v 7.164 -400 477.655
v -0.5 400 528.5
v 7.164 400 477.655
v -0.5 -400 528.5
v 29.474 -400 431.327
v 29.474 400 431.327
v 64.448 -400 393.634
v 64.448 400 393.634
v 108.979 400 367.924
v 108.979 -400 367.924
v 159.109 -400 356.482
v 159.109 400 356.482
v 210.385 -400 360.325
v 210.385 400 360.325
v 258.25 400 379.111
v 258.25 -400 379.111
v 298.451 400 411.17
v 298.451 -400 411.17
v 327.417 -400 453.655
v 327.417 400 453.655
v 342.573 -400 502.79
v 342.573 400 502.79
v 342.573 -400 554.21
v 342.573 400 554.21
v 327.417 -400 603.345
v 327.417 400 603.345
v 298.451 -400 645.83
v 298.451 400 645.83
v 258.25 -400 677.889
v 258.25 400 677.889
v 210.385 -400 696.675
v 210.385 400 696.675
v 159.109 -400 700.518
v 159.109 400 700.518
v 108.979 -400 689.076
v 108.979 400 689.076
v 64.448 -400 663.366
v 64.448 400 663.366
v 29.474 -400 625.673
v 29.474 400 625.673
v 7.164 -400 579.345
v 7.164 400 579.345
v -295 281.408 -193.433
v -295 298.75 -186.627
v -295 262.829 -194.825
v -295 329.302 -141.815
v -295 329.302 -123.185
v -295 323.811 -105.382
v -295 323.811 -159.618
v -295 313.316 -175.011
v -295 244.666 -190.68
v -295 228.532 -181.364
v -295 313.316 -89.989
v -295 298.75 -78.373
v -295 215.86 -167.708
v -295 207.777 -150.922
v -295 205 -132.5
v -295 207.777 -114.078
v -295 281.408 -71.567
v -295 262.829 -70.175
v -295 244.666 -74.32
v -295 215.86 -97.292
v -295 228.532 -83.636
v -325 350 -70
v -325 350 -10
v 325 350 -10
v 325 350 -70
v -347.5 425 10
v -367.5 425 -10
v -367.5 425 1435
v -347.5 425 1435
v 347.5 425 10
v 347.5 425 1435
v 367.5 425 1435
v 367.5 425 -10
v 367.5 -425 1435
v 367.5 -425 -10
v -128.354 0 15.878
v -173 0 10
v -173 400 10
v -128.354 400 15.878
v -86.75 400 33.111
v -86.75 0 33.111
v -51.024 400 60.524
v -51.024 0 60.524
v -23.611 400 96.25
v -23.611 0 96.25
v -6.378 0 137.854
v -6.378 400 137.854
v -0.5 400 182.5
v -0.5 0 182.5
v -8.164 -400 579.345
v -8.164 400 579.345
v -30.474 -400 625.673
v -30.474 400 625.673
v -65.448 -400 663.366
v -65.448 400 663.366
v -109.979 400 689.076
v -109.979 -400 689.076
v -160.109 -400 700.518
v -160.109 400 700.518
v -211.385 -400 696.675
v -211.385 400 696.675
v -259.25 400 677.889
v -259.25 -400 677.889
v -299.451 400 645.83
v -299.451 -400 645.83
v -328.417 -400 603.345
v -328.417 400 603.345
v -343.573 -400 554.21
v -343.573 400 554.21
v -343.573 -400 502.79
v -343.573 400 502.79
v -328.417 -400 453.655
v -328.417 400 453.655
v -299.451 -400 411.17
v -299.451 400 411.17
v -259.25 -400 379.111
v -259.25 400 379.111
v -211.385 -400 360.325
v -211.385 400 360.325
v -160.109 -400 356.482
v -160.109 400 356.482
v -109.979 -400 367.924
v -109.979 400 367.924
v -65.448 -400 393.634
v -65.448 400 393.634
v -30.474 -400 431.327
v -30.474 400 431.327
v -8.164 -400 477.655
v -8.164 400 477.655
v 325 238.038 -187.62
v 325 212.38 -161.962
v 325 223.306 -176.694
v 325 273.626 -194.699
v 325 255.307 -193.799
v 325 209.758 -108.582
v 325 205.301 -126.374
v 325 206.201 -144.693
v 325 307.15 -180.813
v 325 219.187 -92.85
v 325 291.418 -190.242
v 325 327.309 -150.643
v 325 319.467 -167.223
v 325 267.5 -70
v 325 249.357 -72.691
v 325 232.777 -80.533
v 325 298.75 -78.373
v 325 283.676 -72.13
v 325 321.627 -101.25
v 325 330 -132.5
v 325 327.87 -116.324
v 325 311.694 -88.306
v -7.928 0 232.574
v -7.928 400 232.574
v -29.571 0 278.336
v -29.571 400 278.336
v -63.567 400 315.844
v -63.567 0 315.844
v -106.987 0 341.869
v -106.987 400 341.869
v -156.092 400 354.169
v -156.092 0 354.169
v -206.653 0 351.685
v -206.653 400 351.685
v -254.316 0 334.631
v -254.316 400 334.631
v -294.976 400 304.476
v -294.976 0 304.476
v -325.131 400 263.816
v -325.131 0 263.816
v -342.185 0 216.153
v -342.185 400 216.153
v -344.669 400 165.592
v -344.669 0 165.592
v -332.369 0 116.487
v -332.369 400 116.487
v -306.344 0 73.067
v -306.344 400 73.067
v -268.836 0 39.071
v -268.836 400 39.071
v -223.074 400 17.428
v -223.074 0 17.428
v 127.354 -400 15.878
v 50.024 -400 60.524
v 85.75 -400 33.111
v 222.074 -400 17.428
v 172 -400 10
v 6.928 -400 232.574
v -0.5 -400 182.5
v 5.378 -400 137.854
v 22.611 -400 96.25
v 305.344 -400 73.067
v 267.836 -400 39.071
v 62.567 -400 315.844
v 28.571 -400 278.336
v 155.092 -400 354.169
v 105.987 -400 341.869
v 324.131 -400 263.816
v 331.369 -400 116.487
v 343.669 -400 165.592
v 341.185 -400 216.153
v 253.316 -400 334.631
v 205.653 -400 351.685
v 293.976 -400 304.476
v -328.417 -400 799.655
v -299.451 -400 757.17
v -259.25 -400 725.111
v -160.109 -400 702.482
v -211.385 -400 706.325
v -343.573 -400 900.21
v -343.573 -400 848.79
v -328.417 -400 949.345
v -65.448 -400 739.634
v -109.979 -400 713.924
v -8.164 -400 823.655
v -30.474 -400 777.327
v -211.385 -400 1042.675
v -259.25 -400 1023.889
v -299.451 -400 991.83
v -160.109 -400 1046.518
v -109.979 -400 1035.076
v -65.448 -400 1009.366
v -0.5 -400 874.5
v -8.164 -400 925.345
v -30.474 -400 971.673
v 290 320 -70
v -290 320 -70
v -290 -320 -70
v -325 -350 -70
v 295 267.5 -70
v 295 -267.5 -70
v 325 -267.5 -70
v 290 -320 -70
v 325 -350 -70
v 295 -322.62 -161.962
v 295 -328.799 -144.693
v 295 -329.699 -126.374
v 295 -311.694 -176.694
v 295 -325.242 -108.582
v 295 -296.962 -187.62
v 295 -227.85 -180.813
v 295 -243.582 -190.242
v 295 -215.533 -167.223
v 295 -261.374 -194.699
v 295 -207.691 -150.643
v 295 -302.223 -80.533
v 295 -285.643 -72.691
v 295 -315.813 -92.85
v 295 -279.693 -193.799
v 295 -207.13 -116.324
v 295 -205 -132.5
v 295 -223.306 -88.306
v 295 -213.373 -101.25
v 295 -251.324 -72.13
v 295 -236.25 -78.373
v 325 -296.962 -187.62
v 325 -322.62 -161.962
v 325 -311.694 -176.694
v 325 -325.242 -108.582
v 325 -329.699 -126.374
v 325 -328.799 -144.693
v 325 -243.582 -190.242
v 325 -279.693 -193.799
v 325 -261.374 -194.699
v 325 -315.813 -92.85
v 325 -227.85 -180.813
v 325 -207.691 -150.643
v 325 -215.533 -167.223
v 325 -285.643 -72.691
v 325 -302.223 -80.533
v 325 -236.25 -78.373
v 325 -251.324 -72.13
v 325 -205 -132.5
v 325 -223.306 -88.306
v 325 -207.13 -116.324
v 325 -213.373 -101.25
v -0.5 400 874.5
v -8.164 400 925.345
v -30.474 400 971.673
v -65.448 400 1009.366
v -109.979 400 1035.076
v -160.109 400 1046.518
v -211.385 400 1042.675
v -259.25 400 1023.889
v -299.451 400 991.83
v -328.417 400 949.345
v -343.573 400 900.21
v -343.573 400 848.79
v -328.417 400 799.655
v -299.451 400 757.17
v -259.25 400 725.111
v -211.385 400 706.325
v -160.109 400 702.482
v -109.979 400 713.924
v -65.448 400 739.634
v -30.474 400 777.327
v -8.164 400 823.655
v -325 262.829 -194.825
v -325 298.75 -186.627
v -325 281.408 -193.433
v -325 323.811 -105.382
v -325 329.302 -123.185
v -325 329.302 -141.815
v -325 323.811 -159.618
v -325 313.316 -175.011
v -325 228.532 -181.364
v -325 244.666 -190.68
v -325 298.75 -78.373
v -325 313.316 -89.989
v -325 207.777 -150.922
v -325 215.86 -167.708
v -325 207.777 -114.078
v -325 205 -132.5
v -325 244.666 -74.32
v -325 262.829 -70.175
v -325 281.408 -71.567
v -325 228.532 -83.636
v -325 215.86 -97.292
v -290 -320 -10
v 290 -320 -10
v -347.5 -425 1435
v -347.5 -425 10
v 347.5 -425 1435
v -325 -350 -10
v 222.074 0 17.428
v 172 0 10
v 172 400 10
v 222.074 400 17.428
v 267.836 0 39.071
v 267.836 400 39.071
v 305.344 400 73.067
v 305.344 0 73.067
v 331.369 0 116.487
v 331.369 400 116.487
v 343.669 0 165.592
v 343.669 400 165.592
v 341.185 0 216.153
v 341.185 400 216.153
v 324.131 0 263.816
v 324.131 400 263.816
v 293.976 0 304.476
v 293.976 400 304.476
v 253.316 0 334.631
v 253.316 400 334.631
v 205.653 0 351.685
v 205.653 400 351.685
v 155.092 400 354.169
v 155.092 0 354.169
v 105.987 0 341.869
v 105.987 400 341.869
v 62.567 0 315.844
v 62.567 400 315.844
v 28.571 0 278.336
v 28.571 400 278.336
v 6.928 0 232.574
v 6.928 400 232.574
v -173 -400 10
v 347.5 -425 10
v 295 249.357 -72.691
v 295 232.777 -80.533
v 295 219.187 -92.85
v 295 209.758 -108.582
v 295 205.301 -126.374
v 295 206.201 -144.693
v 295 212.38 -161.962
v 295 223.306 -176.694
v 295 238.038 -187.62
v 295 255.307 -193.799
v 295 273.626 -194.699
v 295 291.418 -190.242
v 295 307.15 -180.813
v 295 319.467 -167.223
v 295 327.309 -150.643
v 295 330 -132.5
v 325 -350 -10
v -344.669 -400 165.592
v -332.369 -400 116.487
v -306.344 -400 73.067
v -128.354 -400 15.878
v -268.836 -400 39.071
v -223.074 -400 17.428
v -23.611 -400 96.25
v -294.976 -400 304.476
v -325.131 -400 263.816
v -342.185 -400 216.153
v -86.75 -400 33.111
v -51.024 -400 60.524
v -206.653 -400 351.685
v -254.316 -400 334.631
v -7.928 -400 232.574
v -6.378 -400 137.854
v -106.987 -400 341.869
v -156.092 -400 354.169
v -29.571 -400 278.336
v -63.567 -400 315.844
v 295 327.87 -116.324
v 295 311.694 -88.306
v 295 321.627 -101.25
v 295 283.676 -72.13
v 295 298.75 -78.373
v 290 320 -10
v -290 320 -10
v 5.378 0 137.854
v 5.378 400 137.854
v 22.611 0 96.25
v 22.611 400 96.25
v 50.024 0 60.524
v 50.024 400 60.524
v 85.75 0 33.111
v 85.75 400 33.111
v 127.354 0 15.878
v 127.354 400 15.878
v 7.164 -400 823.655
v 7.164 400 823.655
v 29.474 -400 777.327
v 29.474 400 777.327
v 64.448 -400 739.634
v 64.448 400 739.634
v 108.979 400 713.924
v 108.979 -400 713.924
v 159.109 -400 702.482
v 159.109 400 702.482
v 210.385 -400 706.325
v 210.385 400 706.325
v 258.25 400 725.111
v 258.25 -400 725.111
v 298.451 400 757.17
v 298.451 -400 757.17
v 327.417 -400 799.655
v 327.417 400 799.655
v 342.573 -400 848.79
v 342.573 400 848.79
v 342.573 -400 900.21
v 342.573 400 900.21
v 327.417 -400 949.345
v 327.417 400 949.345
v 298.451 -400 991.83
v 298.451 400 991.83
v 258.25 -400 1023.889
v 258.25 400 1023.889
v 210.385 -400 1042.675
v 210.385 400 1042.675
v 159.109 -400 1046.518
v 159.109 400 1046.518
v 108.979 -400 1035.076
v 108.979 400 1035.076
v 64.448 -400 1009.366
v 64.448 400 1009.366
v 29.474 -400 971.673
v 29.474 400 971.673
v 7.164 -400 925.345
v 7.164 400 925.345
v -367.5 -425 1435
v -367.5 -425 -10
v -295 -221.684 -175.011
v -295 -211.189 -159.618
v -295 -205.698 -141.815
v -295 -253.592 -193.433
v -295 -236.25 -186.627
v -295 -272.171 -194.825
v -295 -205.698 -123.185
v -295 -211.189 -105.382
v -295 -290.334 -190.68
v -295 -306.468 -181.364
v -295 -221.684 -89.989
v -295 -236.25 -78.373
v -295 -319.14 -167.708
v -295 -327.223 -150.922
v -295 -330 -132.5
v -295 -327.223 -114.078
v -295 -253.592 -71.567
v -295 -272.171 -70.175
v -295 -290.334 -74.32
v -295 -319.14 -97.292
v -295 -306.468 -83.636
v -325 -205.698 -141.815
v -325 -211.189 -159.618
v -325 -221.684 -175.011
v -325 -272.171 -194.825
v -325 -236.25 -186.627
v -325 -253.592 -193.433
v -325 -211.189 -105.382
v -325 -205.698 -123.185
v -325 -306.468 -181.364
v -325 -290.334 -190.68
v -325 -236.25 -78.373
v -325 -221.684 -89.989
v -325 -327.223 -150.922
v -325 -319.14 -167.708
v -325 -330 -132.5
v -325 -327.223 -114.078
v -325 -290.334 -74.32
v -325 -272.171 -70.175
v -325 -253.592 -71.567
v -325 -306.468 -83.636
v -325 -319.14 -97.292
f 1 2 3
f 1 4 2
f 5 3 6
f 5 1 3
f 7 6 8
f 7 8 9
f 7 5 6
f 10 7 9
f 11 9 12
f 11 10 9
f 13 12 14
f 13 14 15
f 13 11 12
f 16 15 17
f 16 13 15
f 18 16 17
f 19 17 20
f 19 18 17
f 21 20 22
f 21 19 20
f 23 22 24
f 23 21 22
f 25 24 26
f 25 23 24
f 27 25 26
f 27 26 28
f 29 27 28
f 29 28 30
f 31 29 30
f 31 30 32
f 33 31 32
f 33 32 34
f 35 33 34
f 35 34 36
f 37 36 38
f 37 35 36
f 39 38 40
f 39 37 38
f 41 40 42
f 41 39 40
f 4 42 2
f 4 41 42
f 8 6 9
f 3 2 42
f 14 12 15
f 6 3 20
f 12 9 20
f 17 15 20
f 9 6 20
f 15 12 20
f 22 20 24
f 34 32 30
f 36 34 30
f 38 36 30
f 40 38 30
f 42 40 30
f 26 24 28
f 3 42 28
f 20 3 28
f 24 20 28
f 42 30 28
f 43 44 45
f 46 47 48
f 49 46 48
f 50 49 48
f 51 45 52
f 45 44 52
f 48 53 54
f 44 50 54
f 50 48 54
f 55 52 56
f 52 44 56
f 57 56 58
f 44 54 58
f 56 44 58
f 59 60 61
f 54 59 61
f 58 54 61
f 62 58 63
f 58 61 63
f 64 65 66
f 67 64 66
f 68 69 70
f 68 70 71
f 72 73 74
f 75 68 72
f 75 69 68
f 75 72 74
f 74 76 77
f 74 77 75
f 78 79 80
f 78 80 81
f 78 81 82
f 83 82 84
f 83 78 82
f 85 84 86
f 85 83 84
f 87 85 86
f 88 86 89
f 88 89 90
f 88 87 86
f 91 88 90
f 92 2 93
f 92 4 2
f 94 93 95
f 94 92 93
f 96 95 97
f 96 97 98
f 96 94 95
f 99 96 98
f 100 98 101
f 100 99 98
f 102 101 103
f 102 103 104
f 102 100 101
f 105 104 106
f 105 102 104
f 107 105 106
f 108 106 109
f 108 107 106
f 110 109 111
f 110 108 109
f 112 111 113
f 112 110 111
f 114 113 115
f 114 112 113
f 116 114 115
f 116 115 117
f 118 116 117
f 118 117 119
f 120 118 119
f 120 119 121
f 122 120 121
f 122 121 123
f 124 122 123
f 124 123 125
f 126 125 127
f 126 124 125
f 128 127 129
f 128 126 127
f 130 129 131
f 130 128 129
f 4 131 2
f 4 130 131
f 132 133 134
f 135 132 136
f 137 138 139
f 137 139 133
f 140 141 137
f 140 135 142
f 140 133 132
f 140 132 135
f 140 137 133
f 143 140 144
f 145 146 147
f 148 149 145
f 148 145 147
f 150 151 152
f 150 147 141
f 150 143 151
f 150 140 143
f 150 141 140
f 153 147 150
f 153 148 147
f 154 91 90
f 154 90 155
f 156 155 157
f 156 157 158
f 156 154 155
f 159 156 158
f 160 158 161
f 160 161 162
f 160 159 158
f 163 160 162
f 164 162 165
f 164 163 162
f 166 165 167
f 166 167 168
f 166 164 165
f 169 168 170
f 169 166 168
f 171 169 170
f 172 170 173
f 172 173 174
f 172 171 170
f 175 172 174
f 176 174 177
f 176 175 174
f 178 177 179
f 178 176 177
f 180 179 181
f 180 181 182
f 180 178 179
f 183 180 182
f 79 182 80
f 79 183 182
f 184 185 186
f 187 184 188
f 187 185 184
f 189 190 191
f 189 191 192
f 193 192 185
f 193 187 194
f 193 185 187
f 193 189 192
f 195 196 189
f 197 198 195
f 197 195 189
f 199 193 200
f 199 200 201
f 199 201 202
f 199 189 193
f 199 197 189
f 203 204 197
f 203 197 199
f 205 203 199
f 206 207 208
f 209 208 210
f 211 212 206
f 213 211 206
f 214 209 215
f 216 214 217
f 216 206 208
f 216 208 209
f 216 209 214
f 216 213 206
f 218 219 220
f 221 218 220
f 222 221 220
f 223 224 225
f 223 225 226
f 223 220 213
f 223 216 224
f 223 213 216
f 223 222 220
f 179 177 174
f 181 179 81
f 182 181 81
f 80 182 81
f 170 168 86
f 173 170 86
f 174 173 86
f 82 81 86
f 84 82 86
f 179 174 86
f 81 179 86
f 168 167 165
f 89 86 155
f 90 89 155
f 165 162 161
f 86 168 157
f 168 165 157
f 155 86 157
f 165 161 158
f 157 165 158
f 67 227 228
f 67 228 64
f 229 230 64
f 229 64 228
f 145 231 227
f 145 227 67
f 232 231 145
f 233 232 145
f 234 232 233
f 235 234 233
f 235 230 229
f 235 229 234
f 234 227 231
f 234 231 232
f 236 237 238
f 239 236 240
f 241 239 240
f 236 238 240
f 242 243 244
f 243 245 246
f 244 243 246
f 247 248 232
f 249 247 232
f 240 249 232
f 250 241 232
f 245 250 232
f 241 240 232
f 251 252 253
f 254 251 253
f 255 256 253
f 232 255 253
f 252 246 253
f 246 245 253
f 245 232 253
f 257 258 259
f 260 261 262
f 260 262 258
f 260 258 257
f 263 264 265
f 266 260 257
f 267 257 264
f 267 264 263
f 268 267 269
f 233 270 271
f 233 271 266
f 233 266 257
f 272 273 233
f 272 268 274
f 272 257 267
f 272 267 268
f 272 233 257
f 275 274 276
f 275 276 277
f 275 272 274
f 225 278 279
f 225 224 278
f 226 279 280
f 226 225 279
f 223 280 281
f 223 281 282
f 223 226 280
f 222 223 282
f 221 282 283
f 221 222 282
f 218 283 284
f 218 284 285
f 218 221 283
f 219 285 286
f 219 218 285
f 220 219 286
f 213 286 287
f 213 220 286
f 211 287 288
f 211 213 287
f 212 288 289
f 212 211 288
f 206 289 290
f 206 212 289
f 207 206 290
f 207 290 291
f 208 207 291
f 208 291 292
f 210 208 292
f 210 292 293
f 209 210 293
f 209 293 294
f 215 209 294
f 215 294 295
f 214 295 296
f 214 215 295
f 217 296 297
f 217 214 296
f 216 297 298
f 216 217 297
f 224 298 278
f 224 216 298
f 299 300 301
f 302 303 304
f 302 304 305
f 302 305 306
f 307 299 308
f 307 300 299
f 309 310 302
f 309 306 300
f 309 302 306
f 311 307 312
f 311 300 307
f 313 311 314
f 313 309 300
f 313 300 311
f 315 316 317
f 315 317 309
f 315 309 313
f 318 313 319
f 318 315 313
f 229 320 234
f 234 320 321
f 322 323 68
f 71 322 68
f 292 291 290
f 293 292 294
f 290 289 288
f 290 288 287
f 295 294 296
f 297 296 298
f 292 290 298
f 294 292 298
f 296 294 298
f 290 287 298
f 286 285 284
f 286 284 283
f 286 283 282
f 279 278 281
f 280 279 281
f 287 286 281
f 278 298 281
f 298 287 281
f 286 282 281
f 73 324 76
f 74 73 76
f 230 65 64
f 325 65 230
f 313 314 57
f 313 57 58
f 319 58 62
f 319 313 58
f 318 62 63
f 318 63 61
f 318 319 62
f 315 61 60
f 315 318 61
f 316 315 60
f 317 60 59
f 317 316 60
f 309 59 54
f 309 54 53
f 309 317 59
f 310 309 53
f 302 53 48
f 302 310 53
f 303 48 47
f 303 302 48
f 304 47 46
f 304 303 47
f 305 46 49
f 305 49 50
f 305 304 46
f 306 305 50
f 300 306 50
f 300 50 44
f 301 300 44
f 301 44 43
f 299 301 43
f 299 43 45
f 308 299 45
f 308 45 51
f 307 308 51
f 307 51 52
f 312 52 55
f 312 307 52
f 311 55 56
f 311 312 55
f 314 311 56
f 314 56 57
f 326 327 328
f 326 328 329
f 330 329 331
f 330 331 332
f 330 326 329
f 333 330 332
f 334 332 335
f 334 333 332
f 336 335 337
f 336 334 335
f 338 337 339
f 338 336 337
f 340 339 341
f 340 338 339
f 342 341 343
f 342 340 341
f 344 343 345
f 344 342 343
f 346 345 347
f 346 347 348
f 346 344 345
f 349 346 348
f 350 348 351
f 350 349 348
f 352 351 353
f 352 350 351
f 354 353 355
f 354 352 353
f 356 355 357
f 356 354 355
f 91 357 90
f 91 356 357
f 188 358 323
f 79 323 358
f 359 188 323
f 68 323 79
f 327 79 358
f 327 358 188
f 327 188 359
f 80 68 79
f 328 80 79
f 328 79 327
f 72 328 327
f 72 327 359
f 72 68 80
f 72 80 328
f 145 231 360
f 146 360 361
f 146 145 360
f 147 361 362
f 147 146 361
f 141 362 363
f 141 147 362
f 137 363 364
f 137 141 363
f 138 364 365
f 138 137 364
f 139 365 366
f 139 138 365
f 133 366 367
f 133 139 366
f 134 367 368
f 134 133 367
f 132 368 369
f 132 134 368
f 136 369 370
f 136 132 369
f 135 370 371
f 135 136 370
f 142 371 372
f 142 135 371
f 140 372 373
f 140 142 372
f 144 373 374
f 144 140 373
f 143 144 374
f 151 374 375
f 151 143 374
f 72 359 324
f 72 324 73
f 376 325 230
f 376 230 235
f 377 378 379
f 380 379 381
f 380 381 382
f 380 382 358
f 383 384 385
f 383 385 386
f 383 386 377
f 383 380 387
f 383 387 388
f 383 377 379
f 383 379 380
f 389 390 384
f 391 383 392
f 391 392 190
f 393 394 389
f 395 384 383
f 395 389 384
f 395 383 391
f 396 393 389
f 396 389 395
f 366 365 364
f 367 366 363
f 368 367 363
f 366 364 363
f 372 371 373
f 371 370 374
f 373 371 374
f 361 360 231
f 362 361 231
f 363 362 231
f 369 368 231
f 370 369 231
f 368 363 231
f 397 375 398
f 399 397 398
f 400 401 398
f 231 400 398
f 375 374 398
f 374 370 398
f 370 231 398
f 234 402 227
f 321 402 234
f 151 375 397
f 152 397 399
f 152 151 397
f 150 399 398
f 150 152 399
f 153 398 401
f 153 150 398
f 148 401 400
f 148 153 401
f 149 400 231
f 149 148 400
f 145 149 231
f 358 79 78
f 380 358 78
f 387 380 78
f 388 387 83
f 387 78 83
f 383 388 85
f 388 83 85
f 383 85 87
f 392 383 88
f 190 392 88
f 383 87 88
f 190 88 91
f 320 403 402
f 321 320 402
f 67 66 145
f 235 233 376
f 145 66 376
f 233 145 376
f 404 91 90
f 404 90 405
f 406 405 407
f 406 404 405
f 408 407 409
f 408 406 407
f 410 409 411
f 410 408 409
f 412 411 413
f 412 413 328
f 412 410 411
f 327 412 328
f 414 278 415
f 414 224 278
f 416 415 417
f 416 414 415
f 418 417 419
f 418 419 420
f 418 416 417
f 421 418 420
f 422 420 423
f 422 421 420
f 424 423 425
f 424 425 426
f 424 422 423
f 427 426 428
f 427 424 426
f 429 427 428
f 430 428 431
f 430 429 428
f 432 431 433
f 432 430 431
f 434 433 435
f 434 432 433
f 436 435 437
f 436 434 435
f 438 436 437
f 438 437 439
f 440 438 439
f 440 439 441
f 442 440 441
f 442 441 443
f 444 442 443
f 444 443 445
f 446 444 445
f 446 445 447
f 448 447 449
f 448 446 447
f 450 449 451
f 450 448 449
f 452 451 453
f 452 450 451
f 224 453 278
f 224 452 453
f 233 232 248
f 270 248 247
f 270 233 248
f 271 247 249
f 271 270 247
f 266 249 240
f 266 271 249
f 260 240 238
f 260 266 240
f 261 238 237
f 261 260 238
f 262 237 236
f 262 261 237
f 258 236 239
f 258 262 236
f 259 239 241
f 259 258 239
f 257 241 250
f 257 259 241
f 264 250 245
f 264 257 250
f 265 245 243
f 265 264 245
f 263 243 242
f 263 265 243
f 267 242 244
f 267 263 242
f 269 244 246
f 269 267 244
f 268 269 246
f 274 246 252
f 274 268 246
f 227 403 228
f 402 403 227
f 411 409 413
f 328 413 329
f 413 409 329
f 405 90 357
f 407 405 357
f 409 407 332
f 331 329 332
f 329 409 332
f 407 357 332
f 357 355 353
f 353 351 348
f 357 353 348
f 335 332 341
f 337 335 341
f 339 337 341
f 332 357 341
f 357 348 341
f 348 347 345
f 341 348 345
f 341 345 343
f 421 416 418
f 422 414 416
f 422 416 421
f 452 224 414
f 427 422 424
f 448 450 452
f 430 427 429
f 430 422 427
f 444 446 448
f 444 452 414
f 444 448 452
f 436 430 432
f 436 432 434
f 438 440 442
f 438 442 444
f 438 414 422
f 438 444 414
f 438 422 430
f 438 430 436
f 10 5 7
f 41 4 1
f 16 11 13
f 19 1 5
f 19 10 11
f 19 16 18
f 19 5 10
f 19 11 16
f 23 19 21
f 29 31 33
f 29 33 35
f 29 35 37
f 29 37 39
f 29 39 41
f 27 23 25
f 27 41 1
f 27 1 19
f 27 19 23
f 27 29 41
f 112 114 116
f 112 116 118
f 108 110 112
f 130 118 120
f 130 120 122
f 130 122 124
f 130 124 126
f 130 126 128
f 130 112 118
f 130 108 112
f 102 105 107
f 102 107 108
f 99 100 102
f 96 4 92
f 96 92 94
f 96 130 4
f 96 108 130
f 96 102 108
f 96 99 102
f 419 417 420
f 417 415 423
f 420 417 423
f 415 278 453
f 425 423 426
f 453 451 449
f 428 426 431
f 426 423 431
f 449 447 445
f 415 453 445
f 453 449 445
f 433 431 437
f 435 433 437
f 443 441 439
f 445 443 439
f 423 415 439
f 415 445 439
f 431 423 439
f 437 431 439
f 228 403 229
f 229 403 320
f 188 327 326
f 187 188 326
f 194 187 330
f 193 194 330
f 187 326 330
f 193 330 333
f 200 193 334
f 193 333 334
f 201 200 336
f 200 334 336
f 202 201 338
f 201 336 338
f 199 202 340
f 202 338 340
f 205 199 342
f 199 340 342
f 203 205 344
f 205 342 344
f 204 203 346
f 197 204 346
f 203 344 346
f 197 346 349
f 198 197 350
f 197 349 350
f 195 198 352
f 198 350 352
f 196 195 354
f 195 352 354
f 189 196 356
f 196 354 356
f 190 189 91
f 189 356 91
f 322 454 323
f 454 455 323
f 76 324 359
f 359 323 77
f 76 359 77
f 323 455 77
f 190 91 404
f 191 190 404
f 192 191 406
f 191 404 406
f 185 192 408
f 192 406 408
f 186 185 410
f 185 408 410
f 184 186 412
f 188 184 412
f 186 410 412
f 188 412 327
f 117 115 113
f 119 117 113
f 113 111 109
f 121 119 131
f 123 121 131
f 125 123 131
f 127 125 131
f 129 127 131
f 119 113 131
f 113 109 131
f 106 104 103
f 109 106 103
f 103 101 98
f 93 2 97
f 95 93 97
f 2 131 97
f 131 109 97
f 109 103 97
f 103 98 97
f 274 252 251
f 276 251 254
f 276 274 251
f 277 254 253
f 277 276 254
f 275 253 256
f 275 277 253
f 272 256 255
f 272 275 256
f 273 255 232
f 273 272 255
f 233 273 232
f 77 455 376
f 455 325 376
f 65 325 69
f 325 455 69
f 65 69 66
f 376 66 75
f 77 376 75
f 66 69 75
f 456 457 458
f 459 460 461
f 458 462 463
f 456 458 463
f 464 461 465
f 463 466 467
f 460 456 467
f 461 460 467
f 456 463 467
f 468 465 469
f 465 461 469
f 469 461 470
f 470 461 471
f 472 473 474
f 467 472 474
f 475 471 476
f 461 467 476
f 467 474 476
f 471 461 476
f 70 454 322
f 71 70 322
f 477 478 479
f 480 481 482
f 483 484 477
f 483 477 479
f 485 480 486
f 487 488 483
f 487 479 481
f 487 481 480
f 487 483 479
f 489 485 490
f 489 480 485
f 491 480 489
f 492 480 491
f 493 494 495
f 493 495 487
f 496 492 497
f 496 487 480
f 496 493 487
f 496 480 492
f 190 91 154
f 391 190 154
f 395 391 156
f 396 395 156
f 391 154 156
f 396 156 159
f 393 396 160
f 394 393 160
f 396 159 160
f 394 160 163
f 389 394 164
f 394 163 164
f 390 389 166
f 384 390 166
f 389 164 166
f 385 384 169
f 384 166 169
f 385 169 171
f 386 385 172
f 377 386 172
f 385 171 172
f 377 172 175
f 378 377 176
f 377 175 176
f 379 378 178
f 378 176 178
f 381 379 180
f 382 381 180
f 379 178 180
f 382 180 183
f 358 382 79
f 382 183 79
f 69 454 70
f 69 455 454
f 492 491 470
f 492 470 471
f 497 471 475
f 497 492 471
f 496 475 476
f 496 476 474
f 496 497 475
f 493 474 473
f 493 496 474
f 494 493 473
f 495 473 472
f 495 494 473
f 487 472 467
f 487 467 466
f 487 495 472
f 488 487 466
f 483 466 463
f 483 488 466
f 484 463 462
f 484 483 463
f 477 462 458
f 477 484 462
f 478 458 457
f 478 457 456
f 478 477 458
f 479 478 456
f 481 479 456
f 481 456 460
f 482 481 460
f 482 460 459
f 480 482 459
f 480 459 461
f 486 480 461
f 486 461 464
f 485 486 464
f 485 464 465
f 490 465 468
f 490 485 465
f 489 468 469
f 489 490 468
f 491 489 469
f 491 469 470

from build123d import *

# Parameters (mm, degrees)
F0_W      = 735
F0_H      = 850
F1_DEPTH  = 10
F2_W      = 20
F2_H      = 850
F3_DEPTH  = 1425
F4_R      = 172.5
F5_DEPTH  = 400
F6_W      = 650
F6_H      = 700
F6_W_2    = 580
F6_H_2    = 640
F7_DEPTH  = 60
F8_R      = 62.5
F9_DEPTH  = 30
F10_R     = 62.5
F11_DEPTH = 30


with BuildPart() as f1:
    # F0 (on Top) → F1 (new body, symmetric)
    with BuildSketch(Plane.XY):
        Rectangle(F0_W, F0_H)
    extrude(amount=F1_DEPTH, both=True)

    # F2 (on face) → F3 (join)
    with BuildSketch(Plane.XY.offset(10)):
        with Locations((-357.5, 0)):
            Rectangle(F2_W, F2_H)
        with Locations((357.5, 0)):
            Rectangle(F2_W, F2_H)
    extrude(amount=F3_DEPTH)

    # F4 (on Front) → F5 (join, symmetric)
    with BuildSketch(Plane.XZ):
        with Locations((-173, 182.5)):
            Circle(F4_R)
        with BuildLine():
            ThreePointArc((344.5, 182.5), (172, 355), (-0.5, 182.5))
            ThreePointArc((-0.5, 182.5), (172, 10), (344.5, 182.5))
        make_face()
    extrude(amount=F5_DEPTH, both=True)

    # F6 (on face) → F7 (join)
    with BuildSketch(Plane(origin=(0, 0, -10), x_dir=(1, 0, 0), z_dir=(0, 0, -1))):
        Rectangle(F6_W, F6_H)
        Rectangle(F6_W_2, F6_H_2, mode=Mode.SUBTRACT)
    extrude(amount=F7_DEPTH)

    # F8 (on face) → F9 (join)
    with BuildSketch(Plane.YZ.offset(325)):
        with Locations((-267.5, -132.5)):
            Circle(F8_R)
        with Locations((267.5, -132.5)):
            Circle(F8_R)
    extrude(amount=-F9_DEPTH)


with BuildPart() as f5:
    # F4 (on Front) → F5, piece 2 (new body, symmetric)
    with BuildSketch(Plane.XZ):
        with Locations((-173, 528.5)):
            Circle(F4_R)
    extrude(amount=F5_DEPTH, both=True)

    # F4 (on Front) → F5, piece 3 (join, symmetric)
    with BuildSketch(Plane.XZ):
        with BuildLine():
            ThreePointArc((344.5, 528.5), (172, 701), (-0.5, 528.5))
            ThreePointArc((-0.5, 528.5), (172, 356), (344.5, 528.5))
        make_face()
    extrude(amount=F5_DEPTH, both=True)


with BuildPart() as f5b:
    # F4 (on Front) → F5, piece 4 (new body, symmetric)
    with BuildSketch(Plane.XZ):
        with Locations((-173, 874.5)):
            Circle(F4_R)
    extrude(amount=F5_DEPTH, both=True)

    # F4 (on Front) → F5, piece 5 (join, symmetric)
    with BuildSketch(Plane.XZ):
        with BuildLine():
            ThreePointArc((344.5, 874.5), (172, 1047), (-0.5, 874.5))
            ThreePointArc((-0.5, 874.5), (172, 702), (344.5, 874.5))
        make_face()
    extrude(amount=F5_DEPTH, both=True)


with BuildPart() as f11:
    # F10 (on face) → F11 (new body)
    with BuildSketch(Plane(origin=(-325, 0, 0), x_dir=(0, -1, 0), z_dir=(-1, 0, 0))):
        with Locations((-267.5, -132.5)):
            Circle(F10_R)
    extrude(amount=-F11_DEPTH)


with BuildPart() as f11b:
    # F10 (on face) → F11, piece 2 (new body)
    with BuildSketch(Plane(origin=(-325, 0, 0), x_dir=(0, -1, 0), z_dir=(-1, 0, 0))):
        with Locations((267.5, -132.5)):
            Circle(F10_R)
    extrude(amount=-F11_DEPTH)


solid = Compound([f1.part, f5.part, f5b.part, f11.part, f11b.part])
